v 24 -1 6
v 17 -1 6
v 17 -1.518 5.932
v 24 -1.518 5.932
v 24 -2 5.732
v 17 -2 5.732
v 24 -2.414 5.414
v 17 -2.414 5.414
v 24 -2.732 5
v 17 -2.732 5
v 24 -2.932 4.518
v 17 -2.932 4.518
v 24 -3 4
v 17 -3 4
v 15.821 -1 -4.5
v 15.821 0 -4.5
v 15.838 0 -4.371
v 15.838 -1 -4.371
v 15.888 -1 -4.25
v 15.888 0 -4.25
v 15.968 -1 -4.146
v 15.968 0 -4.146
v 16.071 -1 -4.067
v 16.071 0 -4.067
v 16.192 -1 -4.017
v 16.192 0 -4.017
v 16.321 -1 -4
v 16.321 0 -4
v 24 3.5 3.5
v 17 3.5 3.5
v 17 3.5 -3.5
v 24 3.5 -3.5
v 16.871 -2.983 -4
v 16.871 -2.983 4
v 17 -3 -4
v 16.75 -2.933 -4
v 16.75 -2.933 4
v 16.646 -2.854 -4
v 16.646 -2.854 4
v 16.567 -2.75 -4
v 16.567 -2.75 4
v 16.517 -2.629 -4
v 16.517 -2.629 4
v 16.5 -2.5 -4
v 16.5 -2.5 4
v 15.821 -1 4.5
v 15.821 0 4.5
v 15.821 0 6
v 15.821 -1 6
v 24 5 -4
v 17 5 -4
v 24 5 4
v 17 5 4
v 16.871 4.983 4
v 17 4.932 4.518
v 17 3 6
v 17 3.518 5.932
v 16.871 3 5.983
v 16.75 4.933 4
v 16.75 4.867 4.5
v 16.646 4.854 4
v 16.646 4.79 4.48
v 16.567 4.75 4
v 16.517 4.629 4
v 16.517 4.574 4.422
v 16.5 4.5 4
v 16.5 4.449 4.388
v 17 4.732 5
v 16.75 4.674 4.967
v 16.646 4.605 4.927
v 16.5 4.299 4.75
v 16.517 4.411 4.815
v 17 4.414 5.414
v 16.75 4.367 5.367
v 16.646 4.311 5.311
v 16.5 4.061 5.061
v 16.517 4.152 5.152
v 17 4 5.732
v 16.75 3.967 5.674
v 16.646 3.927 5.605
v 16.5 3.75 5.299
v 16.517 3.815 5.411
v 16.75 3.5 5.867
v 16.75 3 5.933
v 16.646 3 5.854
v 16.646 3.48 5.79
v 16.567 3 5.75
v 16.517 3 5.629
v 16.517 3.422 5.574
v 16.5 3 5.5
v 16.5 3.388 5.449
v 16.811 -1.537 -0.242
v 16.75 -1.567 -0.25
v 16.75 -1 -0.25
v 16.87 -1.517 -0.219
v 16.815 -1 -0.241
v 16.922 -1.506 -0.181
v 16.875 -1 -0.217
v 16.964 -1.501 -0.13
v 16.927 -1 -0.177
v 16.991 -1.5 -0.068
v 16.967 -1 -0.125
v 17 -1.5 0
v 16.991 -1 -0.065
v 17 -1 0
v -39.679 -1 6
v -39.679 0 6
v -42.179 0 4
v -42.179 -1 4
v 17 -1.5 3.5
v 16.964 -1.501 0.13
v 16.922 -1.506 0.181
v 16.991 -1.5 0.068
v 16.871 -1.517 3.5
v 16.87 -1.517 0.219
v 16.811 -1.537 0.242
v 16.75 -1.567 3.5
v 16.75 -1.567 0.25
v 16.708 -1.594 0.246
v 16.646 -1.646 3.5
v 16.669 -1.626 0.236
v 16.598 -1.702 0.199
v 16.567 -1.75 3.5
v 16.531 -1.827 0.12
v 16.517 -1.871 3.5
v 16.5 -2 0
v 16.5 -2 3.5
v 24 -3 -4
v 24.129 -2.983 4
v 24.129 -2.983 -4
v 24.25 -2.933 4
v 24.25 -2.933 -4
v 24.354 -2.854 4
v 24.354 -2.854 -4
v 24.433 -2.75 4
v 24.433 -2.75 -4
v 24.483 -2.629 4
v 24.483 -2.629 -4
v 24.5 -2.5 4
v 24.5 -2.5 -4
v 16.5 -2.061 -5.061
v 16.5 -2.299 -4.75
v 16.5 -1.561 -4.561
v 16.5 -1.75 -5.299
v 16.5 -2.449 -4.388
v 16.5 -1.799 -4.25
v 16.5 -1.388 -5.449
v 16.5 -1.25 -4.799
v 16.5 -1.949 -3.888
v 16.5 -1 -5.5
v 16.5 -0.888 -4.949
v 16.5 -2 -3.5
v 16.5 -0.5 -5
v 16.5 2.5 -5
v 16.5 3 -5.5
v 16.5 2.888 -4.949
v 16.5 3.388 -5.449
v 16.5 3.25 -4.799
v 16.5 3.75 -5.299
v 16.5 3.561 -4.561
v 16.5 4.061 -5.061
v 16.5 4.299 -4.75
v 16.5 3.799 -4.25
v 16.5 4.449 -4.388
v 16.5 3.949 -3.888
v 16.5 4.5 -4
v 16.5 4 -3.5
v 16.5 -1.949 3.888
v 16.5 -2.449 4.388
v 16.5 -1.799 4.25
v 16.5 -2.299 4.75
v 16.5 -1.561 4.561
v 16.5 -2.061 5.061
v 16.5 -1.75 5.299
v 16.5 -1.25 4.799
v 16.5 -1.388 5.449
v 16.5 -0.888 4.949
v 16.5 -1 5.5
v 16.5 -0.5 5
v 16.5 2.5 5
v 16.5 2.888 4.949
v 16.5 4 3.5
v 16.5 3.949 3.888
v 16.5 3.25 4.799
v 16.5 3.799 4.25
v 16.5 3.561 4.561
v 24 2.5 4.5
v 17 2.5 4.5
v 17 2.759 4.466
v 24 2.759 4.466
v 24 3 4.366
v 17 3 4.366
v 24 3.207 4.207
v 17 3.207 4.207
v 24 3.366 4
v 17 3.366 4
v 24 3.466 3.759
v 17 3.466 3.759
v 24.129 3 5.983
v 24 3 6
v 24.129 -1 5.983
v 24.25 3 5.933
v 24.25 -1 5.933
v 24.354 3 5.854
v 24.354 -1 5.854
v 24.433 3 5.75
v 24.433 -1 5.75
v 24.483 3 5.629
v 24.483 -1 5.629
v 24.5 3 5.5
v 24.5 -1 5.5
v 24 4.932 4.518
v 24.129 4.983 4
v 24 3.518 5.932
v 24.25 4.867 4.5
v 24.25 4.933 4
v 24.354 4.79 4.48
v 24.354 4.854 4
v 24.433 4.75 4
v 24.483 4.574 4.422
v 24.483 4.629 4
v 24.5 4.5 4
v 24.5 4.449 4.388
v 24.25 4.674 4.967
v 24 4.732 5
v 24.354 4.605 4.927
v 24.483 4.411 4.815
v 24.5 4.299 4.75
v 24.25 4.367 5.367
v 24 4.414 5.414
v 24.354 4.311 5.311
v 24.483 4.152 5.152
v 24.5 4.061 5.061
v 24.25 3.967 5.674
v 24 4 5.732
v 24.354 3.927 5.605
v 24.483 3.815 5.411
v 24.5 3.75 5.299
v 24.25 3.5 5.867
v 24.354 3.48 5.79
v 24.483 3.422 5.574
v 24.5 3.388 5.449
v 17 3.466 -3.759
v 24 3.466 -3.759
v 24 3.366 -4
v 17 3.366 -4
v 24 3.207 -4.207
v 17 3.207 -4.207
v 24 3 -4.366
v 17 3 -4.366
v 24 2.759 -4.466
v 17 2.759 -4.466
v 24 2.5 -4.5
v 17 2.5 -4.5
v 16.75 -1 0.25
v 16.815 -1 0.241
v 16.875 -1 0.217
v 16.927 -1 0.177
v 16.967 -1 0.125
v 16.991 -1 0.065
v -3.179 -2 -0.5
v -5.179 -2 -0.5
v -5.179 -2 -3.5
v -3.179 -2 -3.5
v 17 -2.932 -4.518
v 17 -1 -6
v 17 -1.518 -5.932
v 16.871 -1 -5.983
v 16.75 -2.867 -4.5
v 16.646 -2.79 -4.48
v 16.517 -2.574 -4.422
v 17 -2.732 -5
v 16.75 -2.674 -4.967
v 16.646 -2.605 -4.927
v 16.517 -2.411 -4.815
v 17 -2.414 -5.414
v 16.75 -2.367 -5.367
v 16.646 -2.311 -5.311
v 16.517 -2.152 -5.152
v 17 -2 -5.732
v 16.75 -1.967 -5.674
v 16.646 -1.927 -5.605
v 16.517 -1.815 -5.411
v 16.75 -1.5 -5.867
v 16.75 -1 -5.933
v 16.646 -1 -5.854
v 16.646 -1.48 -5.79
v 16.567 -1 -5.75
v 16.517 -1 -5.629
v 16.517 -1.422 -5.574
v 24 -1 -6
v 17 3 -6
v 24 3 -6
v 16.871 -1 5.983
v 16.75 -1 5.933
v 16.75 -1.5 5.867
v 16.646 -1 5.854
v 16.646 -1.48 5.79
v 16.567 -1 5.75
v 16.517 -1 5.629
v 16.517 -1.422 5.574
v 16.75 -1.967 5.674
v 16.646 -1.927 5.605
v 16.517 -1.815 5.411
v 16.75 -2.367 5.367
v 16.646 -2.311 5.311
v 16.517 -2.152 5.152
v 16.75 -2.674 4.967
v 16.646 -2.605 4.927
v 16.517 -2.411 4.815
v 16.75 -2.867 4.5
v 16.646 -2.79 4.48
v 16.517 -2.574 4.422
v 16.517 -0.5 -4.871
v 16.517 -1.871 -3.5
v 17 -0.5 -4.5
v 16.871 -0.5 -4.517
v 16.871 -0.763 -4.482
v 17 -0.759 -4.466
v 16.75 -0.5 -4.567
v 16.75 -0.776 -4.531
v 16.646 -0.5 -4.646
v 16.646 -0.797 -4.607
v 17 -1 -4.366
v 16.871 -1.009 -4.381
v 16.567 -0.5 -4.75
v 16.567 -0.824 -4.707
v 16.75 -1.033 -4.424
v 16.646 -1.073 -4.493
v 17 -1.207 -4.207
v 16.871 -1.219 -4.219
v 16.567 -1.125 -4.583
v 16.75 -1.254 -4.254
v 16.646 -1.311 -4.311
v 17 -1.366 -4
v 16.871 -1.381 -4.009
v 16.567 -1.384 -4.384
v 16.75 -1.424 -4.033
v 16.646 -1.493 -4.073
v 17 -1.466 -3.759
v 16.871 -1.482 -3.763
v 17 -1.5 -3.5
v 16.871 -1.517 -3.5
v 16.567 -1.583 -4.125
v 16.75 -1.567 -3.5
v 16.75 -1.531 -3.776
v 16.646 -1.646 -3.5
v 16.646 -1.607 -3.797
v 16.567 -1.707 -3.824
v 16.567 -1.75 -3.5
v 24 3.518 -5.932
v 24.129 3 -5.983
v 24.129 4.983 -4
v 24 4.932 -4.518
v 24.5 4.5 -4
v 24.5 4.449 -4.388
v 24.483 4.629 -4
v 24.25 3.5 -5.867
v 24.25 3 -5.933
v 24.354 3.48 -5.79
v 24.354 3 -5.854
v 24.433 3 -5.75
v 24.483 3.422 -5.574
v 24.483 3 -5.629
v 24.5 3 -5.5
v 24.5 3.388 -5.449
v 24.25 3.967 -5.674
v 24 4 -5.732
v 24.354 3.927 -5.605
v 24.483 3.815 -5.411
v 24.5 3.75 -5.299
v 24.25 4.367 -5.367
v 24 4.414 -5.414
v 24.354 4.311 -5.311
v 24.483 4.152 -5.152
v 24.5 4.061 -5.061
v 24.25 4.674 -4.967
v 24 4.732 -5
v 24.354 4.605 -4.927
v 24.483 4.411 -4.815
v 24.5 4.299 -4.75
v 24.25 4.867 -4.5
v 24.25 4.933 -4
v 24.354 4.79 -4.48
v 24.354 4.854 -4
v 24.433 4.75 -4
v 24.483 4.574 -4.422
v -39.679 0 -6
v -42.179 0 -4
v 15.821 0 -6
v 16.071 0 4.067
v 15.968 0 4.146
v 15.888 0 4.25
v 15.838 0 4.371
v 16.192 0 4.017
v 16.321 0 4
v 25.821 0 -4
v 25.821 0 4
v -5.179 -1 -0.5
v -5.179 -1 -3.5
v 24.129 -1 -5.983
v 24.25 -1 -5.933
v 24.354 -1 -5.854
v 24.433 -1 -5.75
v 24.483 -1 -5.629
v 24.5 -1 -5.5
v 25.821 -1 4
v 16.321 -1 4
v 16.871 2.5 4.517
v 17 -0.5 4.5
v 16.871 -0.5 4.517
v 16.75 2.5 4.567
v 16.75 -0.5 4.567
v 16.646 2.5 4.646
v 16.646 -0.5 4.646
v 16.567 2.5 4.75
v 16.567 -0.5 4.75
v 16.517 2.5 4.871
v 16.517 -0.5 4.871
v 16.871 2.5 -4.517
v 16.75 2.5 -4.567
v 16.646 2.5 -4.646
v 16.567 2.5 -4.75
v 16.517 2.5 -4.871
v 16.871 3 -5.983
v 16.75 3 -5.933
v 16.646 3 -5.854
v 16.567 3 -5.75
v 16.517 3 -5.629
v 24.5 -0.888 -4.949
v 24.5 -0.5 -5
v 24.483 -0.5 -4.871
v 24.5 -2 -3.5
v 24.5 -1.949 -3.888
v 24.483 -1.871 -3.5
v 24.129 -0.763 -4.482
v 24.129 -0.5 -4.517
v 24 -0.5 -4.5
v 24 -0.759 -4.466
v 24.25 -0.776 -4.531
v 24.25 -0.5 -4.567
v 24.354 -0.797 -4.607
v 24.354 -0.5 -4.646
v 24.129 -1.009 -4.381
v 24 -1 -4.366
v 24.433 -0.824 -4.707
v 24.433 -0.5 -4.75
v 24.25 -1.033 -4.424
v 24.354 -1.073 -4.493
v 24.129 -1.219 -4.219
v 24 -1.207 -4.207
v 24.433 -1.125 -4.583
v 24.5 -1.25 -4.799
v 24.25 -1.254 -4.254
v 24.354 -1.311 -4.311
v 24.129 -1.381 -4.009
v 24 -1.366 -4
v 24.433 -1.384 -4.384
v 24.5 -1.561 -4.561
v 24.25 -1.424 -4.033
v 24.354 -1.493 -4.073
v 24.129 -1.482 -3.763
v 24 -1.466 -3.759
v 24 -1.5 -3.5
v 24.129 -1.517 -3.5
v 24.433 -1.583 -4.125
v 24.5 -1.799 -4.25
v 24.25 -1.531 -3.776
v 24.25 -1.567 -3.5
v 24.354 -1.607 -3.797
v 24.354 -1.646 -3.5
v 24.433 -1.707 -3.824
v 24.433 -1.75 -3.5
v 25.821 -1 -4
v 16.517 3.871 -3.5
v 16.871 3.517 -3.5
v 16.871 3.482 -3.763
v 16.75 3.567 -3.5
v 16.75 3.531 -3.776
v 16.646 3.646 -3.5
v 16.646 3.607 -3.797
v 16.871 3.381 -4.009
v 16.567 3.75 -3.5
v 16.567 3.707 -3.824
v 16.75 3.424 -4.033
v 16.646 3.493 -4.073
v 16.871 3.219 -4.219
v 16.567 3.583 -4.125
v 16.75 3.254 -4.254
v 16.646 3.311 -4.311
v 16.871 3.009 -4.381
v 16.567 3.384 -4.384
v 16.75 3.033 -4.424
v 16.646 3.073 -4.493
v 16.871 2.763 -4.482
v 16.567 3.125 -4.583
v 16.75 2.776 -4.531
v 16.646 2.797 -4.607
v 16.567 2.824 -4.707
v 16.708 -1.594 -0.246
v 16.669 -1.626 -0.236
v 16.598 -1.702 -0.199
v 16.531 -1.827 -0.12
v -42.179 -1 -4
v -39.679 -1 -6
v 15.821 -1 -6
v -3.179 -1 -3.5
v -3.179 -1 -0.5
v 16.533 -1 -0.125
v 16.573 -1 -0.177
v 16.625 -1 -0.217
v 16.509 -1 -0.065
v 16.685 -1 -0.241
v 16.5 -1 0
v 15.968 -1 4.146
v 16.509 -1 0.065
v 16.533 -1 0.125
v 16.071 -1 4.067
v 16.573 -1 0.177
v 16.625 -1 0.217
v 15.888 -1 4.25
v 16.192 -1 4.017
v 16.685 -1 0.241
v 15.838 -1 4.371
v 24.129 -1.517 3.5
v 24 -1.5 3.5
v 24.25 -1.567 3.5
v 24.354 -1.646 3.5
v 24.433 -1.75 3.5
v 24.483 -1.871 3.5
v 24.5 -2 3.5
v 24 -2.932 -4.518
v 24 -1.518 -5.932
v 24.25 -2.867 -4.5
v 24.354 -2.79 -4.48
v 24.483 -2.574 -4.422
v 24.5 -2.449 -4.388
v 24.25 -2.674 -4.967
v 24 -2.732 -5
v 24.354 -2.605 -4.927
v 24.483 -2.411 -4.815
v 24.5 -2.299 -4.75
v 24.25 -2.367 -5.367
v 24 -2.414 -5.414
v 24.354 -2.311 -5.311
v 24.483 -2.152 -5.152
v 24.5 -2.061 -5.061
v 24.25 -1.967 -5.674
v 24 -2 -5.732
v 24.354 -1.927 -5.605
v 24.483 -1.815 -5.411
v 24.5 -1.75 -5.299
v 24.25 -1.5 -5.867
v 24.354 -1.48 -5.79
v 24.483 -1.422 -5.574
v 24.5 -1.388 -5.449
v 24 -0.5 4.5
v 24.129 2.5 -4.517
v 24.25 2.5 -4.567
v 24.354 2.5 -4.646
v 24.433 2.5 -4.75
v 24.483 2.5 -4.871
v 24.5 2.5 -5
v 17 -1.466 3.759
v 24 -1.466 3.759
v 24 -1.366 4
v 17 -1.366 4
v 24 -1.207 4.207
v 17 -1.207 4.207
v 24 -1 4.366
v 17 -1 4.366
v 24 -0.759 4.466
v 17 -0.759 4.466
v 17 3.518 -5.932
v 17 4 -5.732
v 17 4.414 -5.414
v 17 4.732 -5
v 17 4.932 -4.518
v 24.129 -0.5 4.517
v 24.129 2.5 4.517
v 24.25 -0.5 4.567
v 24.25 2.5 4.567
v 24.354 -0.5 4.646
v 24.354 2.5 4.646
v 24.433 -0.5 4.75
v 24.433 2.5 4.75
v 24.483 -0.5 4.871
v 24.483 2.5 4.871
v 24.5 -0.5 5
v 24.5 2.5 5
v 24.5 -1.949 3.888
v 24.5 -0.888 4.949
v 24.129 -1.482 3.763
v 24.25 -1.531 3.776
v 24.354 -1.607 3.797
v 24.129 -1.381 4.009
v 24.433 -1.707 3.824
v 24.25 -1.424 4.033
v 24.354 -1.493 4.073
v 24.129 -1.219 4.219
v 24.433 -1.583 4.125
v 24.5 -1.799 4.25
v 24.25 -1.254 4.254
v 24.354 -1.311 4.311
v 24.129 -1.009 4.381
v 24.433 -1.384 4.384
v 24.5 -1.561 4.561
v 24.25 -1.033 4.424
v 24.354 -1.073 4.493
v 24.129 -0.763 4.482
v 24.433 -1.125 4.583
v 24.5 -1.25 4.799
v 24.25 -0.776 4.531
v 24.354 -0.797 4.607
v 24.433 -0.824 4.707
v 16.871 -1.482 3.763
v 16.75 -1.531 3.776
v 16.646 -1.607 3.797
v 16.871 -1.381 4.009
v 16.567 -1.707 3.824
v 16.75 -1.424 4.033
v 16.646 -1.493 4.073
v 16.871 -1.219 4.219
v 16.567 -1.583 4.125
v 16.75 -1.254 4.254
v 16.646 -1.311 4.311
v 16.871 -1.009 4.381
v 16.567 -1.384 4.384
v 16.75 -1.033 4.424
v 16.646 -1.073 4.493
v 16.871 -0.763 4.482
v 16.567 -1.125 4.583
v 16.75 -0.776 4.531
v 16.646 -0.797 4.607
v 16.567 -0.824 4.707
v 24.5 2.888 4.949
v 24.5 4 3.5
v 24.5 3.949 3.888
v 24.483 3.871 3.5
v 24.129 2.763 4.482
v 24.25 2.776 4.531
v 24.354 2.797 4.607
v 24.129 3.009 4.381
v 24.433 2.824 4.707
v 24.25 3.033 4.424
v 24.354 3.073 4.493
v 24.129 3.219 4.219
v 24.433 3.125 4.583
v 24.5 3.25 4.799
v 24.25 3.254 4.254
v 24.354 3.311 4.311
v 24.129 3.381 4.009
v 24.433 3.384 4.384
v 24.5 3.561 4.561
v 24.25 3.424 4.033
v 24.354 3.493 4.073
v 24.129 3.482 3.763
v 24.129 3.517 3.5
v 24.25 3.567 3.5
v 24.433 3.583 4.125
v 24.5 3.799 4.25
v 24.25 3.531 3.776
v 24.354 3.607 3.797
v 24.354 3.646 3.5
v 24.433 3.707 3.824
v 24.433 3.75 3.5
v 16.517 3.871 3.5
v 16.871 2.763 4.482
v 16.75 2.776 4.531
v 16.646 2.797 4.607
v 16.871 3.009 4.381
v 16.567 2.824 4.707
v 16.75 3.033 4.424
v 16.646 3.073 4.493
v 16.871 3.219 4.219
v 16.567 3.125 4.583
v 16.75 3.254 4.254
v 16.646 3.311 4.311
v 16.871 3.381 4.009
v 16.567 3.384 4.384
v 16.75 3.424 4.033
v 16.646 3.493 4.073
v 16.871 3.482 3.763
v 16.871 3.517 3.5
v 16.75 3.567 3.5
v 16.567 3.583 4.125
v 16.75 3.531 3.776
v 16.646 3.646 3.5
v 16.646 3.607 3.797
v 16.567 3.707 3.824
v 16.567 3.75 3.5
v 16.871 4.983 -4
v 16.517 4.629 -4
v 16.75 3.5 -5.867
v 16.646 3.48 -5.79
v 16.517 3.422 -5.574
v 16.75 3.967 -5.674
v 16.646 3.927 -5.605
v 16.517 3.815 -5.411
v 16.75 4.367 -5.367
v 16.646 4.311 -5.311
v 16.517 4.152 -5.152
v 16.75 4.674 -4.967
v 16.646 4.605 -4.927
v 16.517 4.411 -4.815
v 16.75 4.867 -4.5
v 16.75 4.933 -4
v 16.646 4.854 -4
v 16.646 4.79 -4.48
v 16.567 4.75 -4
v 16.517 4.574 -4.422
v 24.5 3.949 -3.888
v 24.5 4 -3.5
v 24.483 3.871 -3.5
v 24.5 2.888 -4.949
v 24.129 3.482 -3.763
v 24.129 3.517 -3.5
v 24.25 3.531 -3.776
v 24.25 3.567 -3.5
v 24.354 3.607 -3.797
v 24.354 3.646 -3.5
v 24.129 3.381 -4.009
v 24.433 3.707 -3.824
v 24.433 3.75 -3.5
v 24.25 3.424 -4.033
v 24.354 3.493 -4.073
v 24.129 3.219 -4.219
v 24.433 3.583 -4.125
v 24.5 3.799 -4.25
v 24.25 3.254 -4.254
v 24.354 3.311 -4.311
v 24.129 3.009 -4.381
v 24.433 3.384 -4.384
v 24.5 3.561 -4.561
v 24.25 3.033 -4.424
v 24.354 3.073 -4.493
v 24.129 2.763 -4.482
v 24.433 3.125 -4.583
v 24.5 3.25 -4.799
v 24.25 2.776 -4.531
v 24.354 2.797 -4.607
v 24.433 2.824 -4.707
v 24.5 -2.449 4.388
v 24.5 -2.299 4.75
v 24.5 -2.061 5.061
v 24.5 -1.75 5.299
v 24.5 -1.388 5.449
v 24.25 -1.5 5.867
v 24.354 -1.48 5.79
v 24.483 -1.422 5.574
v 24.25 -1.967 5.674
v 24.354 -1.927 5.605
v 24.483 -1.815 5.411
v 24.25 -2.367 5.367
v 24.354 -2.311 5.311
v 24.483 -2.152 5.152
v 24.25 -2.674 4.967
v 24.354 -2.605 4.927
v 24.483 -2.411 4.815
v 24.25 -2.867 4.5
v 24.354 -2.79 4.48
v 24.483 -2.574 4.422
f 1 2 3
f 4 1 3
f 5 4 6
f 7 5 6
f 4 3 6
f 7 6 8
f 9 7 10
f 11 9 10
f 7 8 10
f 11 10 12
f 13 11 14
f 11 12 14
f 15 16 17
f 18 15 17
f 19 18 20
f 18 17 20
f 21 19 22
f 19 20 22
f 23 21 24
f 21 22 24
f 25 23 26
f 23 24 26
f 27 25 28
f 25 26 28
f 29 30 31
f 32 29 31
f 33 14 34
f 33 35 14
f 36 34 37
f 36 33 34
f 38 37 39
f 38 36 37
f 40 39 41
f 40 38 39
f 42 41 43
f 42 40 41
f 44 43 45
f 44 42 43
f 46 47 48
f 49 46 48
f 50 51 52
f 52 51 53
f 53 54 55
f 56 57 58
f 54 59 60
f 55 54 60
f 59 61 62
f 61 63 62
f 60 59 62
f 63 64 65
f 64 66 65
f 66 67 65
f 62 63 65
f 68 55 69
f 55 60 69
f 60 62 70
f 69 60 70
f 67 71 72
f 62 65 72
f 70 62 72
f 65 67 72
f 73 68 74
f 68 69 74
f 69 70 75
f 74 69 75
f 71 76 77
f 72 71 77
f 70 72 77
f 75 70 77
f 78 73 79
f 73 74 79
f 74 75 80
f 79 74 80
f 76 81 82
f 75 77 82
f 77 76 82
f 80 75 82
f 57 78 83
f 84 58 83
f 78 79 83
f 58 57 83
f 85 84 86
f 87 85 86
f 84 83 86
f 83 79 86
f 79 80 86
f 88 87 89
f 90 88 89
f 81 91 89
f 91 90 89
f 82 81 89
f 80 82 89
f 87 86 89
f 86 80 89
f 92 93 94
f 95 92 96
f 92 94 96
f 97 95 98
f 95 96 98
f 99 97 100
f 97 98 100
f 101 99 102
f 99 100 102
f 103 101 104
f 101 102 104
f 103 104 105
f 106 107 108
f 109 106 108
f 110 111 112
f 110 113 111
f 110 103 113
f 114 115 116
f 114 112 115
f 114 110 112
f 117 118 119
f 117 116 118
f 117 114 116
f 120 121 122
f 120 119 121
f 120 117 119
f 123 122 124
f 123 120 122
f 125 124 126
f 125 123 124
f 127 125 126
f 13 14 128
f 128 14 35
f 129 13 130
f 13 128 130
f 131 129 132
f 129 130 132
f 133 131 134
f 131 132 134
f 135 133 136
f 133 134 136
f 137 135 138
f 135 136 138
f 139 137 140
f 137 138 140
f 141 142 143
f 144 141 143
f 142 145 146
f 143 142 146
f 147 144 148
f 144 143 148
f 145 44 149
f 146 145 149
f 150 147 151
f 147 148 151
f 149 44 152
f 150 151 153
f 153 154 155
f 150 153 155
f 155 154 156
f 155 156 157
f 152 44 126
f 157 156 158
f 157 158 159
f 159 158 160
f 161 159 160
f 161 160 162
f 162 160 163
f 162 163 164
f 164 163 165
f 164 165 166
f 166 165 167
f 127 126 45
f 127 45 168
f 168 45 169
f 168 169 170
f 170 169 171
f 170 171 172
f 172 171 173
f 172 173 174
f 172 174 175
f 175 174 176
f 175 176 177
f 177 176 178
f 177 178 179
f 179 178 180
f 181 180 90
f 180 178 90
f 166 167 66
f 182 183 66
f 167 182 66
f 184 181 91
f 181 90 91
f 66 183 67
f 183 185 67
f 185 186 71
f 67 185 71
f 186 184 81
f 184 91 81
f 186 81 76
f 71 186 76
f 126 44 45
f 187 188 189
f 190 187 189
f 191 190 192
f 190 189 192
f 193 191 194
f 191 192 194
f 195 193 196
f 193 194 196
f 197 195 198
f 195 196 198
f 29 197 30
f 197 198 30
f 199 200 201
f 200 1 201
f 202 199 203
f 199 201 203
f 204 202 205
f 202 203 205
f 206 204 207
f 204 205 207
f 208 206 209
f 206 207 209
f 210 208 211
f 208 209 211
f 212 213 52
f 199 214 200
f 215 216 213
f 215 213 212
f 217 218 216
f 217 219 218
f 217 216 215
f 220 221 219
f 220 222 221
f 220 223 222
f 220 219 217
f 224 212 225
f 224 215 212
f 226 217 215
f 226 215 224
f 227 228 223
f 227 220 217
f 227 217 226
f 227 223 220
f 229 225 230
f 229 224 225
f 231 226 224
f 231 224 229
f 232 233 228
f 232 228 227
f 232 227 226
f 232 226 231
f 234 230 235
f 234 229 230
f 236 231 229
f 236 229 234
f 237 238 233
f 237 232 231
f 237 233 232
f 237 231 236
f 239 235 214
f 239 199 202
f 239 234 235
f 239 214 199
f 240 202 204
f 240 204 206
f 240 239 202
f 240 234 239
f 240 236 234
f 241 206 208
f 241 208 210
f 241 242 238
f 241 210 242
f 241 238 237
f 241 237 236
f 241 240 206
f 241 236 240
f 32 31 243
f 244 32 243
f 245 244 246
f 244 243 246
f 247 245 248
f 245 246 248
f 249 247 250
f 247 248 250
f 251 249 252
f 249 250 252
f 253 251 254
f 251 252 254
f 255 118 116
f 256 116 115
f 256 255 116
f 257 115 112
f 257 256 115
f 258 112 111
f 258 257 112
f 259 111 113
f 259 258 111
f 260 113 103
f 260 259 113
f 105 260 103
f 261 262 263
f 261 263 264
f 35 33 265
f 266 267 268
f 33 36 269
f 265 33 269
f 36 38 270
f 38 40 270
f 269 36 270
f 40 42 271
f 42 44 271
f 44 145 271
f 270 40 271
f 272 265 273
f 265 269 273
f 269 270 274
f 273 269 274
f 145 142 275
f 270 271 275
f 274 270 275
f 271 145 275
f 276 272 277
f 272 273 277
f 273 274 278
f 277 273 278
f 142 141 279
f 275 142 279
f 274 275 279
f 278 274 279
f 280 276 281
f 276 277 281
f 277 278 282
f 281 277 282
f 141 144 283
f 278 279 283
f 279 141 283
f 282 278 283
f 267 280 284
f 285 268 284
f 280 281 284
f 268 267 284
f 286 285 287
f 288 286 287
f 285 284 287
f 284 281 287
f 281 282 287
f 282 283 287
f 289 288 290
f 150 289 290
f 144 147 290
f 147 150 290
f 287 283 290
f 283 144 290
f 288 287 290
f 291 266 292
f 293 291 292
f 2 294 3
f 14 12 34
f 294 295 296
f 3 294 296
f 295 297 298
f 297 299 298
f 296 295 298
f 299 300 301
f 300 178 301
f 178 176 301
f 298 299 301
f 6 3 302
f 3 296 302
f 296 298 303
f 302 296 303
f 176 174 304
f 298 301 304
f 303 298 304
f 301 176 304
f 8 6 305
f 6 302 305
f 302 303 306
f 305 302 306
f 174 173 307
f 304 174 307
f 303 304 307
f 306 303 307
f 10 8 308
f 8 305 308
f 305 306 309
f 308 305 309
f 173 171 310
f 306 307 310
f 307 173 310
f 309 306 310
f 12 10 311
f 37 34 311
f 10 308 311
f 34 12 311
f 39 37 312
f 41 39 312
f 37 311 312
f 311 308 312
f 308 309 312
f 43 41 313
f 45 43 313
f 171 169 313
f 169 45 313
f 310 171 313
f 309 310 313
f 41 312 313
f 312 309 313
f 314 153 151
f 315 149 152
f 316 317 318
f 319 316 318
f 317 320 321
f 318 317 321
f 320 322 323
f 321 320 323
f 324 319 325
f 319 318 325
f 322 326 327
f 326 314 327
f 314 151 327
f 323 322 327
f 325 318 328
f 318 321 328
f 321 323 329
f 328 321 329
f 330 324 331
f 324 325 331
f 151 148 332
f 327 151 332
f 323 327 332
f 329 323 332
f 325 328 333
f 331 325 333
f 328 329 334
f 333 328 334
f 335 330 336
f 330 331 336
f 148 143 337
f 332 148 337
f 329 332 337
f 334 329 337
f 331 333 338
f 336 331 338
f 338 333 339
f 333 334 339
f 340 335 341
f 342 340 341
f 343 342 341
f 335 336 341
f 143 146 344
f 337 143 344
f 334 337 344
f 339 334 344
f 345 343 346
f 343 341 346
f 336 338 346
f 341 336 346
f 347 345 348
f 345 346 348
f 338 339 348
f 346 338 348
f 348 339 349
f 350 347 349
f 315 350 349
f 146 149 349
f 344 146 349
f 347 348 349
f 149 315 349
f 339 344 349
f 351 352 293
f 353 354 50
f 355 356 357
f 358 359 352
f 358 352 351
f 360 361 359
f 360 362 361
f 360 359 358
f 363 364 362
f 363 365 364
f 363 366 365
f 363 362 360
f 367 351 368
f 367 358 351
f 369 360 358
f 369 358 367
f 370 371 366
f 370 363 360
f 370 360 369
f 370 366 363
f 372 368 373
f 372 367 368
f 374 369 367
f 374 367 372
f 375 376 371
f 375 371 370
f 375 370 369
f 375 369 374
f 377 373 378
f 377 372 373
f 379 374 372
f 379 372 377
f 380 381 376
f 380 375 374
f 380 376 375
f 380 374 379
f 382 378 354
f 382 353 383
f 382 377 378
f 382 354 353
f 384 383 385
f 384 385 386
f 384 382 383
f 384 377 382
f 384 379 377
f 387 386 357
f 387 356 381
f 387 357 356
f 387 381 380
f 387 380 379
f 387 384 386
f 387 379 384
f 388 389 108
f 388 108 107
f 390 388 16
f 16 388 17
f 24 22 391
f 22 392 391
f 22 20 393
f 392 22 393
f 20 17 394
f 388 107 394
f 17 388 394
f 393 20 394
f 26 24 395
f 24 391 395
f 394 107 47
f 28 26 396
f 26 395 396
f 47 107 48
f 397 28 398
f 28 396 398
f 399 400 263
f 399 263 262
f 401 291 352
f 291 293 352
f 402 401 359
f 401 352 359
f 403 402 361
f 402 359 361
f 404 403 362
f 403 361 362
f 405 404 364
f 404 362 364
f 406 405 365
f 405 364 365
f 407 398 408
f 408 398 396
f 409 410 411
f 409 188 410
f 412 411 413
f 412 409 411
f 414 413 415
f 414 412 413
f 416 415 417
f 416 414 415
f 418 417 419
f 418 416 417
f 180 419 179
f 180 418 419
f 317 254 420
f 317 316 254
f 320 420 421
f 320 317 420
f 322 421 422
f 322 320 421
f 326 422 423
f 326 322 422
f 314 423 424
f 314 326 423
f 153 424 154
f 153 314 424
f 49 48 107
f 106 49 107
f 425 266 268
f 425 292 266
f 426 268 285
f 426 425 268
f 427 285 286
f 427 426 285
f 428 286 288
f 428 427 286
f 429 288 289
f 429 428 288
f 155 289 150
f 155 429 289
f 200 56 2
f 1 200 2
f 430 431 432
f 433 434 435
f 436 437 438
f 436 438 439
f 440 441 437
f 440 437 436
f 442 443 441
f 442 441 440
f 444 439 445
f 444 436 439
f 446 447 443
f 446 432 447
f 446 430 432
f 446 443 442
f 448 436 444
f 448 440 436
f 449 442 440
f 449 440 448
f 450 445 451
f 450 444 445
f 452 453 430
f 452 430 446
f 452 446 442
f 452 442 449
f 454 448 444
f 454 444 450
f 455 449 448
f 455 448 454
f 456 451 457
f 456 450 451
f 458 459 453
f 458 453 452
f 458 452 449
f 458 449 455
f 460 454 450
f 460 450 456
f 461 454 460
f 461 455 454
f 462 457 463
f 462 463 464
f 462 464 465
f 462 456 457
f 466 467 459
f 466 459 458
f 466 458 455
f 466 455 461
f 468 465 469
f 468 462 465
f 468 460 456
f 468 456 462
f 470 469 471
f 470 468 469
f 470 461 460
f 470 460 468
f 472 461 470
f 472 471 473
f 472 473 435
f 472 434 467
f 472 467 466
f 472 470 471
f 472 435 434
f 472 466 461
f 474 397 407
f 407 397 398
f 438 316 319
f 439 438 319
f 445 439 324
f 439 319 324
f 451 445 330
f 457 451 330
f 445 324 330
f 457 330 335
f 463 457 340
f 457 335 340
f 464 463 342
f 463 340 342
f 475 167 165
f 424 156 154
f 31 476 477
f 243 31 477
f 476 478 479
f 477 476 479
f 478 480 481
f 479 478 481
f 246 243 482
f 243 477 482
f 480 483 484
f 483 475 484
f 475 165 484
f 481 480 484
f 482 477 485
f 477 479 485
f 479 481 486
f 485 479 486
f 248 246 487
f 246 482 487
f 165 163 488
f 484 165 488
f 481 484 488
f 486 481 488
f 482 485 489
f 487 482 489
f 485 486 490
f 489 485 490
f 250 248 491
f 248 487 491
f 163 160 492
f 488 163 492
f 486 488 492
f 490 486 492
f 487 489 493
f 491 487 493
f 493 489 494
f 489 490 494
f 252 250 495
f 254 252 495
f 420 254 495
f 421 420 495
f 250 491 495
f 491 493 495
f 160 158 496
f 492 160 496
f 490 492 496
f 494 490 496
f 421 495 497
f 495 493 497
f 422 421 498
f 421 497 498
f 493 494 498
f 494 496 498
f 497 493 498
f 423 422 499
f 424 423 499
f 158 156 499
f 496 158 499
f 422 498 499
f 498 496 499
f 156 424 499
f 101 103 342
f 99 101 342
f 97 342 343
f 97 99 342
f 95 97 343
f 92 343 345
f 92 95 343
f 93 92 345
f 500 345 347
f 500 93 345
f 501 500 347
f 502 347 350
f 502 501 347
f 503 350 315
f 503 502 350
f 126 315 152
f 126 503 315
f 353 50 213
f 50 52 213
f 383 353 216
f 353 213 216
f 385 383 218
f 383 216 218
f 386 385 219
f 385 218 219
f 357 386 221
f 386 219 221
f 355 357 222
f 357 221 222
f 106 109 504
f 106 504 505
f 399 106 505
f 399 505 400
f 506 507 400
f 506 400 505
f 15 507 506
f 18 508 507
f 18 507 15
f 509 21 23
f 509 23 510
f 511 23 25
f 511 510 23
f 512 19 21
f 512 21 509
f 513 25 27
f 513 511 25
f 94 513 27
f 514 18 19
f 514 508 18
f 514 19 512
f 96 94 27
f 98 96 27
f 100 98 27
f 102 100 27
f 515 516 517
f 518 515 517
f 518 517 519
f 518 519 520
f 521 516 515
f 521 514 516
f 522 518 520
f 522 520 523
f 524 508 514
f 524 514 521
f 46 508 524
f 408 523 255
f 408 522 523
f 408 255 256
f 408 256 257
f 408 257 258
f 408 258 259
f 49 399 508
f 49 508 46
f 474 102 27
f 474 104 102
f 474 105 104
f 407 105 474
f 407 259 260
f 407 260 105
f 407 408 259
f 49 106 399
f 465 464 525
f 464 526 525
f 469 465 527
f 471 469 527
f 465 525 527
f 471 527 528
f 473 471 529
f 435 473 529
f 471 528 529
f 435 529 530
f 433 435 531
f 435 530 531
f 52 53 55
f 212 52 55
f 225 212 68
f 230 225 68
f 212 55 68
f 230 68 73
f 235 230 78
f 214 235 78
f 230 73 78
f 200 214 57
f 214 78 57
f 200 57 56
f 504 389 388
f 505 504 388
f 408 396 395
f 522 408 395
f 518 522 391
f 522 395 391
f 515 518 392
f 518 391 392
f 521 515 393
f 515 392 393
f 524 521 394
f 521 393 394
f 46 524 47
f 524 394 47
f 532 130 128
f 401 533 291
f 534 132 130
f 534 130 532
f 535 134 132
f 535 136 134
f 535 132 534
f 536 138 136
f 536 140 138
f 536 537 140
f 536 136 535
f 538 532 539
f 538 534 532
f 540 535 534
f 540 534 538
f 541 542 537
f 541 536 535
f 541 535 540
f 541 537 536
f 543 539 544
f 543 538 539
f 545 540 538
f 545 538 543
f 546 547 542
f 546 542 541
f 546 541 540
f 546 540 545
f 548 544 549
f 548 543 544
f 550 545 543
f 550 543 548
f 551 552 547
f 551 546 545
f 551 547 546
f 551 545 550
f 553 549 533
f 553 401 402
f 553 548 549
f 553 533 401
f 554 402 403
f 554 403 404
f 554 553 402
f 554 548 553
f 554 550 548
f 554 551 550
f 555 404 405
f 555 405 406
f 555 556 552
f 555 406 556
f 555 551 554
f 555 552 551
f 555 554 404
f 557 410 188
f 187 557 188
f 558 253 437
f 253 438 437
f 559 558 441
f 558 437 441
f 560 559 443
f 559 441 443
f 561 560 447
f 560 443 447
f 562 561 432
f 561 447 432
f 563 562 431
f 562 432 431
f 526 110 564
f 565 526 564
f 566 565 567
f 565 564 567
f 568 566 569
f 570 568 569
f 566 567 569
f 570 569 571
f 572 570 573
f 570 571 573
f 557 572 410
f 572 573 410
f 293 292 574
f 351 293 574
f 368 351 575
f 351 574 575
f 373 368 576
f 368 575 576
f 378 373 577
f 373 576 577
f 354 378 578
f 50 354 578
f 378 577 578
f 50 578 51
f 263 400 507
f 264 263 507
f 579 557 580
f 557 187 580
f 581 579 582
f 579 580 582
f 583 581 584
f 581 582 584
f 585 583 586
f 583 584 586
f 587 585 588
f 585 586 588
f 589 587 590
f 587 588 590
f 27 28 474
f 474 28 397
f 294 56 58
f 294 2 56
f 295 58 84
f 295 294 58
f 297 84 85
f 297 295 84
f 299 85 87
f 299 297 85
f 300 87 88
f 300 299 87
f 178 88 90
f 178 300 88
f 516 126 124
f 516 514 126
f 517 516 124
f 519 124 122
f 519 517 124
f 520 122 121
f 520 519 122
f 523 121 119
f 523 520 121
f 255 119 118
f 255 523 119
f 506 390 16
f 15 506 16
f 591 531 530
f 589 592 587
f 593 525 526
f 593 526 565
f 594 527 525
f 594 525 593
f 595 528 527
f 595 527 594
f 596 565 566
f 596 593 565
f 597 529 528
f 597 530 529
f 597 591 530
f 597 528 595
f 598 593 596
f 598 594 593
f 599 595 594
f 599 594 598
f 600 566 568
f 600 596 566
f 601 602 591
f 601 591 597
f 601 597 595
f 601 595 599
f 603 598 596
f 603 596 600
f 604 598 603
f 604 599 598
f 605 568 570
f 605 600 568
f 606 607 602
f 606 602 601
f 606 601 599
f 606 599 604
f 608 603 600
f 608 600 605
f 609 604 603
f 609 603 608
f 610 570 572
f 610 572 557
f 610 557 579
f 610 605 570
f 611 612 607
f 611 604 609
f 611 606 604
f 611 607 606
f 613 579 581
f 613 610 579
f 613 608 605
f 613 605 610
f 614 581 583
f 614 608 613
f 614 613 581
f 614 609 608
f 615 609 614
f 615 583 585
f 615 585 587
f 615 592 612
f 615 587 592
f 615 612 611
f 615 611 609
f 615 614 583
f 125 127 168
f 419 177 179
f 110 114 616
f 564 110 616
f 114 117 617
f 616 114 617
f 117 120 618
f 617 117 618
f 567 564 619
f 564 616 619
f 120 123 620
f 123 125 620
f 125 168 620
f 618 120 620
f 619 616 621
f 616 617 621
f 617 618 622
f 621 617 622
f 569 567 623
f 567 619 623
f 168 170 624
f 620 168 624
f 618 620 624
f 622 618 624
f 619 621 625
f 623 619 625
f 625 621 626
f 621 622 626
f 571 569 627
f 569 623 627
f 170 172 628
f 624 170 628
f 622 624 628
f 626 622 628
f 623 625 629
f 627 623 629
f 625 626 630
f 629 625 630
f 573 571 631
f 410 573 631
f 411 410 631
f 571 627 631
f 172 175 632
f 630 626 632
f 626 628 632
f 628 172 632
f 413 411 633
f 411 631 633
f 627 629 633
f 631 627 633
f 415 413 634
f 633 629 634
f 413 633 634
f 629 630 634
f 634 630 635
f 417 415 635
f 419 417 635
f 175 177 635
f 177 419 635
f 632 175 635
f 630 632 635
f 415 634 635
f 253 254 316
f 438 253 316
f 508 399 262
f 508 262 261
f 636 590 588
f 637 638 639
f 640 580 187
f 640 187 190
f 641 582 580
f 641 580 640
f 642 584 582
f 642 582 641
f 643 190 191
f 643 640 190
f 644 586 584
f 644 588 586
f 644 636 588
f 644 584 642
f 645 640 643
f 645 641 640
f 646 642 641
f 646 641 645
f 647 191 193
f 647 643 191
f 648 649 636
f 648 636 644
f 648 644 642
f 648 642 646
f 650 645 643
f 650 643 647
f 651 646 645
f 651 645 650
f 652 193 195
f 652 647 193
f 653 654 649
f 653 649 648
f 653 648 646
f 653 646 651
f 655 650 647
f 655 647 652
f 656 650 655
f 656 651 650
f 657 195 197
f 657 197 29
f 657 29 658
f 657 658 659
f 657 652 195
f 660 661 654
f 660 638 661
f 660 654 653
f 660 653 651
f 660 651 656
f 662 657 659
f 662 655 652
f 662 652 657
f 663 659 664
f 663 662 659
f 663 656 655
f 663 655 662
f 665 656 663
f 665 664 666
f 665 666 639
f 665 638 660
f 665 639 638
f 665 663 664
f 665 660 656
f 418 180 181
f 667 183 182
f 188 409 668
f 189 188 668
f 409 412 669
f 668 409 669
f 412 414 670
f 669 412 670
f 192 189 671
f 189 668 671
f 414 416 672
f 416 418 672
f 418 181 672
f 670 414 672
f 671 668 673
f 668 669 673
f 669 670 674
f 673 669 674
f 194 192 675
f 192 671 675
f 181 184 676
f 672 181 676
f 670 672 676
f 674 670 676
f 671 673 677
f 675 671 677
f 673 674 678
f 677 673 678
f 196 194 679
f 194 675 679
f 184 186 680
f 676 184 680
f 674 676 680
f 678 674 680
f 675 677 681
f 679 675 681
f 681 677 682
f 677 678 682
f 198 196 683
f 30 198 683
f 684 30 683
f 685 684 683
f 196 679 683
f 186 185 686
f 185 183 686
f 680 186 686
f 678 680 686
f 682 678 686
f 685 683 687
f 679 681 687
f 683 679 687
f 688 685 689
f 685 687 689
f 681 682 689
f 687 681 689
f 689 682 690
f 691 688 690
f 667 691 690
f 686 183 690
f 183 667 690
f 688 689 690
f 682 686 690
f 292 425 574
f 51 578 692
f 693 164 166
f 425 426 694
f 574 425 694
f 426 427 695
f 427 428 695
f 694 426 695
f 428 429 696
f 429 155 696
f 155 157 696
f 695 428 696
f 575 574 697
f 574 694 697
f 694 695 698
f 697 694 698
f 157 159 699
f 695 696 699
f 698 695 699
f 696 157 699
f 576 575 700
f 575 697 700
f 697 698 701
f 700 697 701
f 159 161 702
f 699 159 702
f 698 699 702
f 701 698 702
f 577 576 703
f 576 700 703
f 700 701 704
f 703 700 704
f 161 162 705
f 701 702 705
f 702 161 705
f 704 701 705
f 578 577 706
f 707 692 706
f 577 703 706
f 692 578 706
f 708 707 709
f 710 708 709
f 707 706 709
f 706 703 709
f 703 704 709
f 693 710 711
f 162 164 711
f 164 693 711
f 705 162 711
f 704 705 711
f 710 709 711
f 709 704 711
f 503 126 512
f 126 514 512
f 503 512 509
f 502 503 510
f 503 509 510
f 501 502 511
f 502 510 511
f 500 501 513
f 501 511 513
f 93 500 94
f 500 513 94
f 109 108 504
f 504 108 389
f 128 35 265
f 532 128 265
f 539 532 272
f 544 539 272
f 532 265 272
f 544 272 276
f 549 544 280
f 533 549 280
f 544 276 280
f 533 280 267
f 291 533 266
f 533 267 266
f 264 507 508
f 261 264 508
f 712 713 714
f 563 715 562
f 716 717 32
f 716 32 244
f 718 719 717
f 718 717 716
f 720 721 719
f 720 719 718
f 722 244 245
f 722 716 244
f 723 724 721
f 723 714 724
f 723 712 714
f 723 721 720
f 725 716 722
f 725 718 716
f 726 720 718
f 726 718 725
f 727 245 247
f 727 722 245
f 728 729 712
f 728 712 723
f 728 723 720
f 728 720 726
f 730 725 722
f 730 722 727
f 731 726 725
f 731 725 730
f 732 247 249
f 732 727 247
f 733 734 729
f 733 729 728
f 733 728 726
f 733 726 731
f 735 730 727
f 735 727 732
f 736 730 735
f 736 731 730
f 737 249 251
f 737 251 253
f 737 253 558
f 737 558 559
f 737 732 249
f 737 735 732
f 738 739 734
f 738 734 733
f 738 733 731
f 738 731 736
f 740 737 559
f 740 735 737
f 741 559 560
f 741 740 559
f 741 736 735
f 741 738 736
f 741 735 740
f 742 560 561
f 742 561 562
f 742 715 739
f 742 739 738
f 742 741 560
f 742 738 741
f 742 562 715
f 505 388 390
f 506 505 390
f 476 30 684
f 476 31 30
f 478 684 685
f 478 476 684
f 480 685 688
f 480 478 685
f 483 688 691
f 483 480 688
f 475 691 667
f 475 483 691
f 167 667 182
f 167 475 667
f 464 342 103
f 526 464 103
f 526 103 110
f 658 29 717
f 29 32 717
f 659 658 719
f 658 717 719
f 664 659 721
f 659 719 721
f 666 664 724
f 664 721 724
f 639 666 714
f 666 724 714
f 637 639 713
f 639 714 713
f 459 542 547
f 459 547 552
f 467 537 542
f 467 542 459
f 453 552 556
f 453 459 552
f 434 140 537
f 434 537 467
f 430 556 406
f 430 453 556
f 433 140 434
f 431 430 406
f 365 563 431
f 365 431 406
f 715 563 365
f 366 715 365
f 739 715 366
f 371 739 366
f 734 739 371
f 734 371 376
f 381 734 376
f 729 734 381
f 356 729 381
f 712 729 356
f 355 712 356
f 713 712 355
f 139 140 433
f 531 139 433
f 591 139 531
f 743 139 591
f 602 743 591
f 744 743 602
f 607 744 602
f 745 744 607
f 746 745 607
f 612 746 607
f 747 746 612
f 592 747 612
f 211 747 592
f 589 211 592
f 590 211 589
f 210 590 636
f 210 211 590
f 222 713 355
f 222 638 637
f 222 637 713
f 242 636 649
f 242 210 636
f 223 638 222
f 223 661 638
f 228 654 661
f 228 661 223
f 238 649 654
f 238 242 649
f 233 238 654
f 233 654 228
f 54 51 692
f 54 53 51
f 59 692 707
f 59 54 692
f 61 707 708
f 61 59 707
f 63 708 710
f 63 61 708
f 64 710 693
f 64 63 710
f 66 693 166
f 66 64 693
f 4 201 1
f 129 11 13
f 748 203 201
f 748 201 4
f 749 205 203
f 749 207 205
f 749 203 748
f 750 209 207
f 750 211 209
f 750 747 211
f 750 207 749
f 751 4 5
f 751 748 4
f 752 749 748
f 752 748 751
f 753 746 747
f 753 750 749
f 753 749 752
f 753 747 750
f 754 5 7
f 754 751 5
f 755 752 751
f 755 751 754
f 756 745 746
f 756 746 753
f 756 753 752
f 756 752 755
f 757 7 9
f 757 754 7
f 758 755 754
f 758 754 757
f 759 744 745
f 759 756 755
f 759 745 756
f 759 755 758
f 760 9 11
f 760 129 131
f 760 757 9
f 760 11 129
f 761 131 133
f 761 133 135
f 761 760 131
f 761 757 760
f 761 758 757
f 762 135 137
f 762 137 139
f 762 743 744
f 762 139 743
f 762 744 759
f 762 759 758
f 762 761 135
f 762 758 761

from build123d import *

# Parameters (mm, degrees)
F1_DEPTH  = 1
F4_DEPTH  = 8
F5_R      = 0.5
F6_W      = 2
F6_H      = 0.5
F7_DEPTH  = 0.5
F8_R      = 0.24999
F9_W      = 2
F9_H      = 3
F10_DEPTH = 2


# Not quite as in the source:
# - a fillet or chamfer is up to 0.001 mm smaller than in the source, because OpenCascade refuses the exact size


with BuildPart() as f1:
    # F0 (on Front) → F1 (new body)
    with BuildSketch(Plane.XZ):
        with BuildLine():
            Line((-42.178902775, 4), (-42.178902775, 0))
            Line((-42.178902775, 0), (-42.178902775, -4))
            Line((-42.178902775, -4), (-39.678902775, -6))
            Line((-39.678902775, -6), (15.821097225, -6))
            Line((15.821097225, -6), (15.821097225, -4.5))
            ThreePointArc((15.821097225, -4.5), (15.9675438344, -4.1464466094), (16.321097225, -4))
            Line((16.321097225, -4), (25.821097225, -4))
            Line((25.821097225, -4), (25.821097225, 0))
            Line((25.821097225, 0), (25.821097225, 4))
            Line((25.821097225, 4), (16.321097225, 4))
            ThreePointArc((16.321097225, 4), (15.9675438344, 4.1464466094), (15.821097225, 4.5))
            Line((15.821097225, 4.5), (15.821097225, 6))
            Line((15.821097225, 6), (-39.678902775, 6))
            Line((-39.678902775, 6), (-42.178902775, 4))
        make_face()
    extrude(amount=F1_DEPTH)



with BuildPart() as f4:
    # F3 (on offset) → F4 (new body)
    with BuildSketch(Plane.YZ.offset(16.5)):
        with BuildLine():
            Line((-1, -6), (3, -6))
            ThreePointArc((3, -6), (4.4142135624, -5.4142135624), (5, -4))
            Line((5, -4), (5, 4))
            ThreePointArc((5, 4), (4.4142135624, 5.4142135624), (3, 6))
            Line((3, 6), (-1, 6))
            ThreePointArc((-1, 6), (-2.4142135624, 5.4142135624), (-3, 4))
            Line((-3, 4), (-3, -4))
            ThreePointArc((-3, -4), (-2.4142135624, -5.4142135624), (-1, -6))
        make_face()
        with BuildLine():
            ThreePointArc((3.5, -3.5), (3.2071067812, -4.2071067812), (2.5, -4.5))
            Line((2.5, -4.5), (-0.5, -4.5))
            ThreePointArc((-0.5, -4.5), (-1.2071067812, -4.2071067812), (-1.5, -3.5))
            Line((-1.5, -3.5), (-1.5, 3.5))
            ThreePointArc((-1.5, 3.5), (-1.2071067812, 4.2071067812), (-0.5, 4.5))
            Line((-0.5, 4.5), (2.5, 4.5))
            ThreePointArc((2.5, 4.5), (3.2071067812, 4.2071067812), (3.5, 3.5))
            Line((3.5, 3.5), (3.5, -3.5))
        make_face(mode=Mode.SUBTRACT)
    extrude(amount=F4_DEPTH)

    # F5
    f5_edges = [f4.edges().sort_by_distance(p)[0] for p in [
        (24.5, -2.414214, 5.414214),
        (24.5, -1.207107, 4.207107),
        (16.5, -1.207107, 4.207107),
        (16.5, -2.414214, 5.414214),
    ]]
    fillet(f5_edges, radius=F5_R)


with BuildPart() as f1_1:
    add(f1.part)

    add(f4.part)  # F7 merges F4
    # F6 (on offset) → F7 (join)
    with BuildSketch(Plane.YZ.offset(16.5)):
        with Locations((-1.159823034, 0)):
            Rectangle(F6_W, F6_H)
    extrude(amount=F7_DEPTH)

    # F8 (radius 0.25 in the source; OpenCascade refuses exactly that, so slightly less here)
    f8_edges = [f1_1.edges().sort_by_distance(p)[0] for p in [
        (17, -1.25, 0.25),
        (17, -1.25, -0.25),
        (16.5, -1.5, -0.25),
        (16.5, -1.5, 0.25),
    ]]
    fillet(f8_edges, radius=F8_R)

    # F9 (on Front) → F10 (join)
    with BuildSketch(Plane.XZ):
        with Locations((-4.178902775, -2)):
            Rectangle(F9_W, F9_H)
    extrude(amount=F10_DEPTH)


solid = f1_1.part
